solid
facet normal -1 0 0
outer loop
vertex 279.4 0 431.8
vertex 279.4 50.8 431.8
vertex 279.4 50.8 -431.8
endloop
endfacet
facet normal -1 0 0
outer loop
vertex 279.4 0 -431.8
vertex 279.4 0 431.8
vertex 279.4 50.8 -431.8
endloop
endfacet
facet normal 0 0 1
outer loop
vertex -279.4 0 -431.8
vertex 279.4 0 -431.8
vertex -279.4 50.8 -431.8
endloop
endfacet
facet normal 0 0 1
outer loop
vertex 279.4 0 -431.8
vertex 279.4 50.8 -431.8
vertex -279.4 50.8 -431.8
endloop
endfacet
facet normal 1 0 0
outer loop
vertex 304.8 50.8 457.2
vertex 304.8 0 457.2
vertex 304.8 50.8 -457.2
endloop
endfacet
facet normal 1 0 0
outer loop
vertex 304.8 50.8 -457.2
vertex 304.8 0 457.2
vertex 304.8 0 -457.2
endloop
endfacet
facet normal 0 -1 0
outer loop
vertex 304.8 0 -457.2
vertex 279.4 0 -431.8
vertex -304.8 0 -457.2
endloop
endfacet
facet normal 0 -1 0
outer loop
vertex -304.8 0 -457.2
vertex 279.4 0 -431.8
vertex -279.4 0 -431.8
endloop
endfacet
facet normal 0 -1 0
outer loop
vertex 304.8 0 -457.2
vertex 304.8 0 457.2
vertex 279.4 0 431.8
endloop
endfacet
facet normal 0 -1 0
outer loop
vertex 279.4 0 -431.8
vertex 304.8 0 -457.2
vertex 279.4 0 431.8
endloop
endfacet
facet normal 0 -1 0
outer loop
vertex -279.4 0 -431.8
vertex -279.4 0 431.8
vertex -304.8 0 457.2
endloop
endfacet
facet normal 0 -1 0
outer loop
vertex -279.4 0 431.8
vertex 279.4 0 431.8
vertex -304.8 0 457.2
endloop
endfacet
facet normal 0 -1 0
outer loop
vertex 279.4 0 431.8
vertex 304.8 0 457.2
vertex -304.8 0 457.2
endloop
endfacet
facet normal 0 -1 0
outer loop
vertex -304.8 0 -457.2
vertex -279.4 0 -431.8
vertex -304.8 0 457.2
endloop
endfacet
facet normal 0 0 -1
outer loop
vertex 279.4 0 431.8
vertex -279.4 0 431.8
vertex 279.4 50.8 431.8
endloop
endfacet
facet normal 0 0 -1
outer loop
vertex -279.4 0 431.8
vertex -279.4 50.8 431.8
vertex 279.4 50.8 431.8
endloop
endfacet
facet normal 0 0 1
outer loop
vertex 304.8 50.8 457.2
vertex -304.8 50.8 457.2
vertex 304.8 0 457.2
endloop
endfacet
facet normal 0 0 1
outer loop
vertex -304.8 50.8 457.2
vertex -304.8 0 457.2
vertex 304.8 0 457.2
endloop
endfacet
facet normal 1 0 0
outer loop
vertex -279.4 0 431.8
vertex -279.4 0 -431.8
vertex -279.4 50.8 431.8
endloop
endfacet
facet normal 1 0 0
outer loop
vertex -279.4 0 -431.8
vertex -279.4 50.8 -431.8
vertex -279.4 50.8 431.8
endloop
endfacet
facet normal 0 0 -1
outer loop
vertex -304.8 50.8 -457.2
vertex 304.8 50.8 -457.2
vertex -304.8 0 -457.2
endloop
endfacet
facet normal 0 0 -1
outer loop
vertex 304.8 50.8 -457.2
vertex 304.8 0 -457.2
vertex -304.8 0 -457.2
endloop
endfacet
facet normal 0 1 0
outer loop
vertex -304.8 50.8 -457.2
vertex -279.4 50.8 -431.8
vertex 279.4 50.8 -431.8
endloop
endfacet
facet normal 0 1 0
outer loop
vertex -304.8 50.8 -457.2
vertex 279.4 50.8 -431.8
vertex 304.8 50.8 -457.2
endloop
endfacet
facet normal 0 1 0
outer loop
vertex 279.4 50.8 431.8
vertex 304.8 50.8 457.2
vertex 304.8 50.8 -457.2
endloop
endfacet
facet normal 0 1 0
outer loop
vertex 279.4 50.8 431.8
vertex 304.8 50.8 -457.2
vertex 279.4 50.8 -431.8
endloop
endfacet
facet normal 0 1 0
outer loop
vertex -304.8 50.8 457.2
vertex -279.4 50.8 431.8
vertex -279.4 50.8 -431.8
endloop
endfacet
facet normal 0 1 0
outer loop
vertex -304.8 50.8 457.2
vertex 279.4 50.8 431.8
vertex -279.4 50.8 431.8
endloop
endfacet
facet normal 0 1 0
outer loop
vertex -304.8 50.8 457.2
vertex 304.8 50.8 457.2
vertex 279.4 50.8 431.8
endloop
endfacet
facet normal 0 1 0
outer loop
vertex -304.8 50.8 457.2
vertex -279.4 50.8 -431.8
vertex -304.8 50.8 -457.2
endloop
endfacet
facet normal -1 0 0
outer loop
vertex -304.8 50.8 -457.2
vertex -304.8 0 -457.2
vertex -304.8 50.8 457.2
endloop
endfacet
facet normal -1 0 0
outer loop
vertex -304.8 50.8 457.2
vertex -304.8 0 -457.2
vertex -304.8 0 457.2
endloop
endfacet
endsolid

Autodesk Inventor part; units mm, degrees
ref_plane "YZ Plane" through (0, 0, 0) normal (1, 0, 0) x (0, 1, 0)
ref_plane "XZ Plane" through (0, 0, 0) normal (0, 1, 0) x (-1, 0, 0)
ref_plane "XY Plane" through (0, 0, 0) normal (0, 0, 1) x (1, 0, 0)
sketch "Sketch2" plane through (0, 0, 0) normal (0, 1, 0) x (-1, 0, 0)
  line L0 (304.8, 457.2) -> (-304.8, 457.2)
  line L1 (-304.8, 457.2) -> (-304.8, -457.2)
  line L2 (-304.8, -457.2) -> (304.8, -457.2)
  line L3 (304.8, -457.2) -> (304.8, 457.2)
  point P0 (0, 0)
  point P1 (304.8, 0)
  point P2 (0, 457.2)
  dimension "d4" = 609.6
  dimension "d5" = 914.4
extrude "Extrusion2" add sketch "Sketch2" along normal blind 50.8
sketch "Sketch3" plane through (0, 50.8, 0) normal (0, 1, 0) x (1, 0, 0)
  line L0 (279.4, -431.8) -> (279.4, 431.8)
  line L1 (279.4, 431.8) -> (-279.4, 431.8)
  line L2 (-279.4, 431.8) -> (-279.4, -431.8)
  line L3 (-279.4, -431.8) -> (279.4, -431.8)
  line L4 (279.4, -431.8) -> (-279.4, 431.8) construction
  line L5 (279.4, 431.8) -> (-279.4, -431.8) construction
  line L6 (-279.4, -431.8) -> (-304.8, -431.8)
  line L7 (-304.8, 457.2) -> (-304.8, -457.2) projected
  line L8 (-279.4, -431.8) -> (-279.4, -457.2)
  line L9 (279.4, -431.8) -> (279.4, -457.2)
  line L10 (-304.8, -457.2) -> (304.8, -457.2) projected
  line L11 (279.4, -431.8) -> (304.8, -431.8)
  line L12 (304.8, -457.2) -> (304.8, 457.2) projected
  line L13 (279.4, 431.8) -> (304.8, 431.8)
  line L14 (279.4, 431.8) -> (279.4, 457.2)
  line L15 (-279.4, 431.8) -> (-304.8, 431.8)
  line L16 (-279.4, 431.8) -> (-279.4, 457.2)
  line L17 (304.8, 457.2) -> (-304.8, 457.2) projected
  point P0 (0, 0)
  dimension "d8" = 863.6
  dimension "d9" = 558.8
extrude "Extrusion3" cut sketch "Sketch3" against normal blind 50.8 contours L3 L2 L1 L0
properties part number "Base stock holder"
